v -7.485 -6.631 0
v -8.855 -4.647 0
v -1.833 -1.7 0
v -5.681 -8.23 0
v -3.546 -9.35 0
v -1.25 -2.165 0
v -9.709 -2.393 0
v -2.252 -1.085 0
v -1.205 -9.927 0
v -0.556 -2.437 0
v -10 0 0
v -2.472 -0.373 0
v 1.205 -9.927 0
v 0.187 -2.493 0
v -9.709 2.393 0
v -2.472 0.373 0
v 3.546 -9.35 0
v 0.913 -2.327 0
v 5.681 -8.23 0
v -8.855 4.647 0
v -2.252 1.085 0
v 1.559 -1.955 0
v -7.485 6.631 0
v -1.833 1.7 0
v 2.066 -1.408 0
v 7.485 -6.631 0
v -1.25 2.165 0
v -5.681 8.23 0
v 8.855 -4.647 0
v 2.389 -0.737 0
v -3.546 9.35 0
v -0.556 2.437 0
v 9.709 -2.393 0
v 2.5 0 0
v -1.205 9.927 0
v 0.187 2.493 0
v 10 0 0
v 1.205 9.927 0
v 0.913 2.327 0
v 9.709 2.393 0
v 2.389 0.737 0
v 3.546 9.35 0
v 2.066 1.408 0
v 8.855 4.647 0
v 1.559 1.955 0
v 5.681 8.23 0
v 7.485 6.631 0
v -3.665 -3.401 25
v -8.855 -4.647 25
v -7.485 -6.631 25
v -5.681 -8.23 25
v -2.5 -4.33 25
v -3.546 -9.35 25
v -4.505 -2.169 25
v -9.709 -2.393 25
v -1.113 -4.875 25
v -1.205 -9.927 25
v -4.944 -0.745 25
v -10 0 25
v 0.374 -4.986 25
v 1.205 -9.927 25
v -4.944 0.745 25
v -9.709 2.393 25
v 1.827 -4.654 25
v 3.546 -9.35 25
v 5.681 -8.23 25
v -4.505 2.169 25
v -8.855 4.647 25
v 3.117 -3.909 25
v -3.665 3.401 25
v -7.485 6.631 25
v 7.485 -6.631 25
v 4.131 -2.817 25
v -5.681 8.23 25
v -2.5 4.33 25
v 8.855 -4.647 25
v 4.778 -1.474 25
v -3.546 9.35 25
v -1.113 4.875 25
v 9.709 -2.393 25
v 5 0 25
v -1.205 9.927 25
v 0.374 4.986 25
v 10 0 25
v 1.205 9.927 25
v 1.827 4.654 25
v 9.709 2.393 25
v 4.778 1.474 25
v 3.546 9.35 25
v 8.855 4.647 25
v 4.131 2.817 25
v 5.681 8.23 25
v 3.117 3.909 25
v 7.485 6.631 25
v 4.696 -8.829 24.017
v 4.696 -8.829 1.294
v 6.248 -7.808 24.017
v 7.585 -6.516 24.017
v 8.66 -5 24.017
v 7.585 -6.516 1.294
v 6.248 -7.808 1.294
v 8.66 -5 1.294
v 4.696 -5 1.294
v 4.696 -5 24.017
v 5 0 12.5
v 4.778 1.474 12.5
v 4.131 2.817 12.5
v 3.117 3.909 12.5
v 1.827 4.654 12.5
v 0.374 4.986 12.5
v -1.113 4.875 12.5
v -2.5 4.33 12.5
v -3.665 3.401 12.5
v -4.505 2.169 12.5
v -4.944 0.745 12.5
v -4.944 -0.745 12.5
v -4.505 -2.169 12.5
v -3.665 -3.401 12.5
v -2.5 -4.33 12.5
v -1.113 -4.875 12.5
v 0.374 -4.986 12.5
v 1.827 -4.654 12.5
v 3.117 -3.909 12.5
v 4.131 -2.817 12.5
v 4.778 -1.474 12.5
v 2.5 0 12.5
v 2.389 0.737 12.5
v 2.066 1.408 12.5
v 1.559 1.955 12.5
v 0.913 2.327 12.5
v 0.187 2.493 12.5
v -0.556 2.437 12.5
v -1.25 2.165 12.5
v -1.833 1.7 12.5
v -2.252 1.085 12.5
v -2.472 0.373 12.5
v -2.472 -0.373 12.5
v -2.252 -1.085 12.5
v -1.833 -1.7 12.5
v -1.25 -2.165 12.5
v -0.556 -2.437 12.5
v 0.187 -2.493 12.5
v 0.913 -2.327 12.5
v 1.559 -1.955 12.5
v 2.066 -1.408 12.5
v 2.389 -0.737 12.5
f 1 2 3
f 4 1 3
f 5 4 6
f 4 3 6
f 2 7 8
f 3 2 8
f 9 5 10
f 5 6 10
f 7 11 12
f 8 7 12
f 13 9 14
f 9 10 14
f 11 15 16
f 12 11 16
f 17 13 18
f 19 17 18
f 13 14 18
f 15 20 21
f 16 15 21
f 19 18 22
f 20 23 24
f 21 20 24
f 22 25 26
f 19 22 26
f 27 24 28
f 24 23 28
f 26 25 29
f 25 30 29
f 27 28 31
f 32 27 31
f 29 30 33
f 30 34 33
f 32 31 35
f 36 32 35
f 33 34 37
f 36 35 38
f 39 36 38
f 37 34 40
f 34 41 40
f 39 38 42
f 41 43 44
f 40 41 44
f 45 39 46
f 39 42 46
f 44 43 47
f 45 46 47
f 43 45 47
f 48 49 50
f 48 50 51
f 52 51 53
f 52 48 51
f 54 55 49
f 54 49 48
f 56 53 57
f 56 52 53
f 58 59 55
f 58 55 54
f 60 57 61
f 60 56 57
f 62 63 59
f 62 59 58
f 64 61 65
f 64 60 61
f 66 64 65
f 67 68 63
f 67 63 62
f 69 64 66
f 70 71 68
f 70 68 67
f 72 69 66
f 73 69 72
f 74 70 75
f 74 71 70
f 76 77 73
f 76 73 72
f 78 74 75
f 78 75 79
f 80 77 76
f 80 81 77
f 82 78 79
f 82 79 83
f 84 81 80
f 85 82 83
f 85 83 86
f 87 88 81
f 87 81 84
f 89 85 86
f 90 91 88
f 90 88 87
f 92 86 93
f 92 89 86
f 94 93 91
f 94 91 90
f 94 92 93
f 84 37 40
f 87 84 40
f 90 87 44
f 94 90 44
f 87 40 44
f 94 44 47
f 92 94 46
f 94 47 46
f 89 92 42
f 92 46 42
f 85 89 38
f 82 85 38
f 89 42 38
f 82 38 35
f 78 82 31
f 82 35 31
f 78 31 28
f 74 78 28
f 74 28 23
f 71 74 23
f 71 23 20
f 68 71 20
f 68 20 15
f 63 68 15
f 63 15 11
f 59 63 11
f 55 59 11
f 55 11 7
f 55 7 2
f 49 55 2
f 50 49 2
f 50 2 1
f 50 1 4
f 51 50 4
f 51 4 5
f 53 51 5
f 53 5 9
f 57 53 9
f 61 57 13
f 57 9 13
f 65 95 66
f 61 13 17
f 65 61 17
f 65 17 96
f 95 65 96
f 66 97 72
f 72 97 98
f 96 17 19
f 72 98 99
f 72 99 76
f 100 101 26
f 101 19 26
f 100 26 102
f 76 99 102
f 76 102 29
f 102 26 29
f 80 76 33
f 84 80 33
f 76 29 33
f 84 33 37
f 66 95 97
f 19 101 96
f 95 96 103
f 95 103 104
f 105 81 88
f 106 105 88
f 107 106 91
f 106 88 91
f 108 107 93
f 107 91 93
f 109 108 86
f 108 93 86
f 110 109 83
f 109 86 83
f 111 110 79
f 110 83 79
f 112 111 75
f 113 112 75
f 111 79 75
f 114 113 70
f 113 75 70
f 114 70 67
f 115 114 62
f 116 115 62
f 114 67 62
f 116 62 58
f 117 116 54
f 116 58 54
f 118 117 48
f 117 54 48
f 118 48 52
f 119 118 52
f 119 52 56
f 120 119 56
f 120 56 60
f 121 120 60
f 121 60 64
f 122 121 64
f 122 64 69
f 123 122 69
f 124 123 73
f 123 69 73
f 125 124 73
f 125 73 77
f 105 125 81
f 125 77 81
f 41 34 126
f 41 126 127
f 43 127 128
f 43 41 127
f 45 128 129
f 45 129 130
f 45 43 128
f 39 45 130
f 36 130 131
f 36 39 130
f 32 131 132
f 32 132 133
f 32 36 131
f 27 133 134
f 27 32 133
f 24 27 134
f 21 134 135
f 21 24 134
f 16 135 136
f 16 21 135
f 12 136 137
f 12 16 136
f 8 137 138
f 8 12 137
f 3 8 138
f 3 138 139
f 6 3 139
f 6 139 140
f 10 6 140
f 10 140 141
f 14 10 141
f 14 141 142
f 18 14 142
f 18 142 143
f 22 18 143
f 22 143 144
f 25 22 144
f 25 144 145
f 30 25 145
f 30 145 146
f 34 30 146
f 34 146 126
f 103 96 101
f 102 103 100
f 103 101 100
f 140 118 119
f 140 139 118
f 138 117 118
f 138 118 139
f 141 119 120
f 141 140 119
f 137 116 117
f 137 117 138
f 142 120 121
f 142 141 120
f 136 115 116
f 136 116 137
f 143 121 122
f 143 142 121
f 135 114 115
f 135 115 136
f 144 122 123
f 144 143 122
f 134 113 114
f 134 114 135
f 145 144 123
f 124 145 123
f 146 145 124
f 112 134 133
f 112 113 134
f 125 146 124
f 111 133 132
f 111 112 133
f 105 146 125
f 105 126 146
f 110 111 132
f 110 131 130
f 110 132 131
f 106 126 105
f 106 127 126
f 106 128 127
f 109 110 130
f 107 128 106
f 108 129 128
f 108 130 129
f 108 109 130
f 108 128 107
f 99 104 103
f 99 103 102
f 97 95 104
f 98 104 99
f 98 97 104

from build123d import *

# Parameters (mm, degrees)
F0_R     = 10
F0_R_2   = 2.5
F1_DEPTH = 25
F2_R     = 5
F2_R_2   = 2.5
F3_DEPTH = 12.5
F5_W     = 4.468582
F5_H     = 22.723214
F6_DEPTH = 5


with BuildPart() as f1:
    # F0 (on Top) → F1 (new body)
    with BuildSketch(Plane.XY):
        Circle(F0_R)
        Circle(F0_R_2, mode=Mode.SUBTRACT)
    extrude(amount=F1_DEPTH)

    # F2 (on face) → F3 (cut)
    with BuildSketch(Plane.XY.offset(25)):
        Circle(F2_R)
        Circle(F2_R_2, mode=Mode.SUBTRACT)
    extrude(amount=-F3_DEPTH, mode=Mode.SUBTRACT)

    # F5 (on offset) → F6 (cut)
    with BuildSketch(Plane.XZ.offset(10)):
        with Locations((6.929936, 12.65571)):
            Rectangle(F5_W, F5_H)
    extrude(amount=-F6_DEPTH, mode=Mode.SUBTRACT)


solid = f1.part
